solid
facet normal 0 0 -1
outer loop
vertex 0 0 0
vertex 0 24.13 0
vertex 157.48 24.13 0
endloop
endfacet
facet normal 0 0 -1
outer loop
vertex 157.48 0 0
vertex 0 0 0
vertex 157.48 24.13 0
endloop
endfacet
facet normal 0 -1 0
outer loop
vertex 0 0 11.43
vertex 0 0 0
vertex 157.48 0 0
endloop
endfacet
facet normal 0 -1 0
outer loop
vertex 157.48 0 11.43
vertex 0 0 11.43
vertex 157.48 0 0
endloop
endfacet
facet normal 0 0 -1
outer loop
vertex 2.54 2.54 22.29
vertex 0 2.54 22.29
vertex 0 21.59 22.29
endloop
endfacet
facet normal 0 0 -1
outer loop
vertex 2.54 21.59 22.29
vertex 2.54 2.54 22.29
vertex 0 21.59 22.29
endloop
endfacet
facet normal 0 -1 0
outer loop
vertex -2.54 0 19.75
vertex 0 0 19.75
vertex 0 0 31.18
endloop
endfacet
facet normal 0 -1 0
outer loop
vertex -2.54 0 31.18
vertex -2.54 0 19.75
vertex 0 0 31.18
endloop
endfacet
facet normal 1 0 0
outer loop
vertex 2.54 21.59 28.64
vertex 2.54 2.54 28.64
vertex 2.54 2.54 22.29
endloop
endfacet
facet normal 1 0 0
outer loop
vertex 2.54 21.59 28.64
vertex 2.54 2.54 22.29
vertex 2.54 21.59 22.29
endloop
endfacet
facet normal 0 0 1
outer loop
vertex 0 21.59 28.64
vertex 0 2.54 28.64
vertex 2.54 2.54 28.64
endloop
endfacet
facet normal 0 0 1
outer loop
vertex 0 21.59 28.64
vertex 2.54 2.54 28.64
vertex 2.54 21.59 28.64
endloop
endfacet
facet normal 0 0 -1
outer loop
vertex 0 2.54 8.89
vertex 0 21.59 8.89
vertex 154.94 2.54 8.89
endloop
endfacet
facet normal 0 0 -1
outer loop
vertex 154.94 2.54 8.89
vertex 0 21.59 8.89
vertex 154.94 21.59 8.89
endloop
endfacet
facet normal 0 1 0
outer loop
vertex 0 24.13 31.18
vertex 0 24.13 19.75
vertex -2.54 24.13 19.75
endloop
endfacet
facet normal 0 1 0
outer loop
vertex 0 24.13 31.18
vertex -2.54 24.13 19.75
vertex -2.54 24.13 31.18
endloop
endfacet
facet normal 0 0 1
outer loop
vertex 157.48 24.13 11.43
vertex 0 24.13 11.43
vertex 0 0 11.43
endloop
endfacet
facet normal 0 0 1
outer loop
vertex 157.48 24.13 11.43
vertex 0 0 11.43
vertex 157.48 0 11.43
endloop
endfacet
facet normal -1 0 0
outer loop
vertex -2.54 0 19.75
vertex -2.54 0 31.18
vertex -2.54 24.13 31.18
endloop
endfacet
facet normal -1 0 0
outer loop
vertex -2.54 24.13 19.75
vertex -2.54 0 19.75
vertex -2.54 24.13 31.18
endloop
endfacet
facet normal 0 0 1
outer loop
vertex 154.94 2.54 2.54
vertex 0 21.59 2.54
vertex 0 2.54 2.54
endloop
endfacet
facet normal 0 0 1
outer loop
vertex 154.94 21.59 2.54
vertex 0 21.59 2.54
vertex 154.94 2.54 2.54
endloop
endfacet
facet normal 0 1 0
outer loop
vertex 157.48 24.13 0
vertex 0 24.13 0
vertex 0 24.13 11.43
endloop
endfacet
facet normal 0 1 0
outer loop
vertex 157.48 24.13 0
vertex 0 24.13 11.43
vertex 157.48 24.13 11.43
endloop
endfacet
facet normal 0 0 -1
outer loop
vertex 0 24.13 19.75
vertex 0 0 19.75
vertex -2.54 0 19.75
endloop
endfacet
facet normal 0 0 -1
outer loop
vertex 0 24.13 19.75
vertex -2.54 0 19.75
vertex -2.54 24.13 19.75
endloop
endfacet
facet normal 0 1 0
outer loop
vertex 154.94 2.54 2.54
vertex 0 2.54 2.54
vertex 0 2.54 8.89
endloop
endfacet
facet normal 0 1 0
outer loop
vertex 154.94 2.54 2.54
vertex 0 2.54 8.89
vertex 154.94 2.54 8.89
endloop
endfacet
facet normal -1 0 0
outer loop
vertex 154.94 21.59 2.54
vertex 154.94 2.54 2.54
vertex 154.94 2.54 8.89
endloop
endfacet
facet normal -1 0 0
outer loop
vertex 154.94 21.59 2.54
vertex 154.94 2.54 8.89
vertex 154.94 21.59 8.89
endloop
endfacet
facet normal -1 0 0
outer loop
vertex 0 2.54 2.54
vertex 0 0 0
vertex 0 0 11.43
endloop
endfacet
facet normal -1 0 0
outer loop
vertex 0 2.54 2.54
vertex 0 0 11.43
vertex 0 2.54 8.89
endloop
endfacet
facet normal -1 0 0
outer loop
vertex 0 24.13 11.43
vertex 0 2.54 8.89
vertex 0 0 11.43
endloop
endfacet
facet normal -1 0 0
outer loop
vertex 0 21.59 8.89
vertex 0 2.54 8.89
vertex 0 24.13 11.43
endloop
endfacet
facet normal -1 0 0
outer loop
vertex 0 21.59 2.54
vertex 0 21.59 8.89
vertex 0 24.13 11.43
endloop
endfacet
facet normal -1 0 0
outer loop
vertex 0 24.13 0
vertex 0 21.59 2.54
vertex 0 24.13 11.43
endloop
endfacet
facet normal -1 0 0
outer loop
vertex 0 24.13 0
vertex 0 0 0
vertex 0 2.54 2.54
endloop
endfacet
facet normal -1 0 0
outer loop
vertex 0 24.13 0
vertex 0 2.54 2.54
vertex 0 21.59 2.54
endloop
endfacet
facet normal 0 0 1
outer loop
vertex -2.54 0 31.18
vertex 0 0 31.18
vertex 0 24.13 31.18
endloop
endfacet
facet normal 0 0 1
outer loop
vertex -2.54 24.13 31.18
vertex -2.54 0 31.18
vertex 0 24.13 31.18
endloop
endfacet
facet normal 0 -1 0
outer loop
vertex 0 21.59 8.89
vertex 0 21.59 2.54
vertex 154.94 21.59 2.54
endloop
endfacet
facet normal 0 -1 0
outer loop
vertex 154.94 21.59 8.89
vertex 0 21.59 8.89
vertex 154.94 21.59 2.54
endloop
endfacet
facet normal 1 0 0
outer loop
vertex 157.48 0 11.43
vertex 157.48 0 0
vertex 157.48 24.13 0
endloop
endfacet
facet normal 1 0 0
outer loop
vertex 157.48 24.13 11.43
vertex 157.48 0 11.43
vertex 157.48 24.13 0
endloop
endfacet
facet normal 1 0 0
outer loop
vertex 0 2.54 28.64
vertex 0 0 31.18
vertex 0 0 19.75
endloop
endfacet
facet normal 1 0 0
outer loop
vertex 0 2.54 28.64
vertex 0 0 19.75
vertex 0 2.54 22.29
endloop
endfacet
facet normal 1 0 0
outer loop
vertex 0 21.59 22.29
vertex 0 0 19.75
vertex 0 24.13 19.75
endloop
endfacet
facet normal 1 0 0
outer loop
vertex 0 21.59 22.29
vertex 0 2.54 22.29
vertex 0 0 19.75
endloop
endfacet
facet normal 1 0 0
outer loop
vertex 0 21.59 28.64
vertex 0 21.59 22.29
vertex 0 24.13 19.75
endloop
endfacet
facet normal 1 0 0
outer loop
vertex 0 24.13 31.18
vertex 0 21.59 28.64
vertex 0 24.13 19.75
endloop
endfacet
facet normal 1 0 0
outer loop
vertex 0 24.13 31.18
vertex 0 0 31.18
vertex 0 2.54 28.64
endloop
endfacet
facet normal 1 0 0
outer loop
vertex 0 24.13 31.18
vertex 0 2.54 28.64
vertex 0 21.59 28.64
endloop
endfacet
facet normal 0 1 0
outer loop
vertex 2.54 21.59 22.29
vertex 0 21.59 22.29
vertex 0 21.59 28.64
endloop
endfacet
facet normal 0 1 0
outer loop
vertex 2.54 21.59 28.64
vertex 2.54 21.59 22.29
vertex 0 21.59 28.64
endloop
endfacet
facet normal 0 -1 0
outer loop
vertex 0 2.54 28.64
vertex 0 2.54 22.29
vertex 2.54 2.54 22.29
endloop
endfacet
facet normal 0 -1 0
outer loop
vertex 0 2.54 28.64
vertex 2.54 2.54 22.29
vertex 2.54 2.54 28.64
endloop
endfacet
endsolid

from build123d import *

# Parameters (mm, degrees)
F0_W     = 157.48
F0_H     = 24.13
F1_DEPTH = 11.43
F2_T     = -2.54
F3_W     = 24.13
F3_H     = 11.43
F3_W_2   = 19.05
F3_H_2   = 6.35
F4_DEPTH = 2.54
F5_DEPTH = 2.54


with BuildPart() as f1:
    # F0 (on Top) → F1 (new body)
    with BuildSketch(Plane.XY):
        with Locations((78.74, 12.065)):
            Rectangle(F0_W, F0_H)
    extrude(amount=F1_DEPTH)

    # F2
    f2_openings = [f1.faces().sort_by_distance(p)[0] for p in [
        (0, 12.065, 5.715),
    ]]
    offset(amount=F2_T, openings=f2_openings)


with BuildPart() as f4:
    # F3 (on Right) → F4 (new body)
    with BuildSketch(Plane.YZ):
        with Locations((12.065, 25.464915)):
            Rectangle(F3_W, F3_H)
        with Locations((12.065, 25.464915)):
            Rectangle(F3_W_2, F3_H_2, mode=Mode.SUBTRACT)
        with Locations((12.065, 25.464915)):
            Rectangle(F3_W_2, F3_H_2)
    extrude(amount=-F4_DEPTH)

    # F3 (on Right) → F5 (join)
    with BuildSketch(Plane.YZ):
        with Locations((12.065, 25.464915)):
            Rectangle(F3_W_2, F3_H_2)
    extrude(amount=F5_DEPTH)


solid = Compound([f1.part, f4.part])
